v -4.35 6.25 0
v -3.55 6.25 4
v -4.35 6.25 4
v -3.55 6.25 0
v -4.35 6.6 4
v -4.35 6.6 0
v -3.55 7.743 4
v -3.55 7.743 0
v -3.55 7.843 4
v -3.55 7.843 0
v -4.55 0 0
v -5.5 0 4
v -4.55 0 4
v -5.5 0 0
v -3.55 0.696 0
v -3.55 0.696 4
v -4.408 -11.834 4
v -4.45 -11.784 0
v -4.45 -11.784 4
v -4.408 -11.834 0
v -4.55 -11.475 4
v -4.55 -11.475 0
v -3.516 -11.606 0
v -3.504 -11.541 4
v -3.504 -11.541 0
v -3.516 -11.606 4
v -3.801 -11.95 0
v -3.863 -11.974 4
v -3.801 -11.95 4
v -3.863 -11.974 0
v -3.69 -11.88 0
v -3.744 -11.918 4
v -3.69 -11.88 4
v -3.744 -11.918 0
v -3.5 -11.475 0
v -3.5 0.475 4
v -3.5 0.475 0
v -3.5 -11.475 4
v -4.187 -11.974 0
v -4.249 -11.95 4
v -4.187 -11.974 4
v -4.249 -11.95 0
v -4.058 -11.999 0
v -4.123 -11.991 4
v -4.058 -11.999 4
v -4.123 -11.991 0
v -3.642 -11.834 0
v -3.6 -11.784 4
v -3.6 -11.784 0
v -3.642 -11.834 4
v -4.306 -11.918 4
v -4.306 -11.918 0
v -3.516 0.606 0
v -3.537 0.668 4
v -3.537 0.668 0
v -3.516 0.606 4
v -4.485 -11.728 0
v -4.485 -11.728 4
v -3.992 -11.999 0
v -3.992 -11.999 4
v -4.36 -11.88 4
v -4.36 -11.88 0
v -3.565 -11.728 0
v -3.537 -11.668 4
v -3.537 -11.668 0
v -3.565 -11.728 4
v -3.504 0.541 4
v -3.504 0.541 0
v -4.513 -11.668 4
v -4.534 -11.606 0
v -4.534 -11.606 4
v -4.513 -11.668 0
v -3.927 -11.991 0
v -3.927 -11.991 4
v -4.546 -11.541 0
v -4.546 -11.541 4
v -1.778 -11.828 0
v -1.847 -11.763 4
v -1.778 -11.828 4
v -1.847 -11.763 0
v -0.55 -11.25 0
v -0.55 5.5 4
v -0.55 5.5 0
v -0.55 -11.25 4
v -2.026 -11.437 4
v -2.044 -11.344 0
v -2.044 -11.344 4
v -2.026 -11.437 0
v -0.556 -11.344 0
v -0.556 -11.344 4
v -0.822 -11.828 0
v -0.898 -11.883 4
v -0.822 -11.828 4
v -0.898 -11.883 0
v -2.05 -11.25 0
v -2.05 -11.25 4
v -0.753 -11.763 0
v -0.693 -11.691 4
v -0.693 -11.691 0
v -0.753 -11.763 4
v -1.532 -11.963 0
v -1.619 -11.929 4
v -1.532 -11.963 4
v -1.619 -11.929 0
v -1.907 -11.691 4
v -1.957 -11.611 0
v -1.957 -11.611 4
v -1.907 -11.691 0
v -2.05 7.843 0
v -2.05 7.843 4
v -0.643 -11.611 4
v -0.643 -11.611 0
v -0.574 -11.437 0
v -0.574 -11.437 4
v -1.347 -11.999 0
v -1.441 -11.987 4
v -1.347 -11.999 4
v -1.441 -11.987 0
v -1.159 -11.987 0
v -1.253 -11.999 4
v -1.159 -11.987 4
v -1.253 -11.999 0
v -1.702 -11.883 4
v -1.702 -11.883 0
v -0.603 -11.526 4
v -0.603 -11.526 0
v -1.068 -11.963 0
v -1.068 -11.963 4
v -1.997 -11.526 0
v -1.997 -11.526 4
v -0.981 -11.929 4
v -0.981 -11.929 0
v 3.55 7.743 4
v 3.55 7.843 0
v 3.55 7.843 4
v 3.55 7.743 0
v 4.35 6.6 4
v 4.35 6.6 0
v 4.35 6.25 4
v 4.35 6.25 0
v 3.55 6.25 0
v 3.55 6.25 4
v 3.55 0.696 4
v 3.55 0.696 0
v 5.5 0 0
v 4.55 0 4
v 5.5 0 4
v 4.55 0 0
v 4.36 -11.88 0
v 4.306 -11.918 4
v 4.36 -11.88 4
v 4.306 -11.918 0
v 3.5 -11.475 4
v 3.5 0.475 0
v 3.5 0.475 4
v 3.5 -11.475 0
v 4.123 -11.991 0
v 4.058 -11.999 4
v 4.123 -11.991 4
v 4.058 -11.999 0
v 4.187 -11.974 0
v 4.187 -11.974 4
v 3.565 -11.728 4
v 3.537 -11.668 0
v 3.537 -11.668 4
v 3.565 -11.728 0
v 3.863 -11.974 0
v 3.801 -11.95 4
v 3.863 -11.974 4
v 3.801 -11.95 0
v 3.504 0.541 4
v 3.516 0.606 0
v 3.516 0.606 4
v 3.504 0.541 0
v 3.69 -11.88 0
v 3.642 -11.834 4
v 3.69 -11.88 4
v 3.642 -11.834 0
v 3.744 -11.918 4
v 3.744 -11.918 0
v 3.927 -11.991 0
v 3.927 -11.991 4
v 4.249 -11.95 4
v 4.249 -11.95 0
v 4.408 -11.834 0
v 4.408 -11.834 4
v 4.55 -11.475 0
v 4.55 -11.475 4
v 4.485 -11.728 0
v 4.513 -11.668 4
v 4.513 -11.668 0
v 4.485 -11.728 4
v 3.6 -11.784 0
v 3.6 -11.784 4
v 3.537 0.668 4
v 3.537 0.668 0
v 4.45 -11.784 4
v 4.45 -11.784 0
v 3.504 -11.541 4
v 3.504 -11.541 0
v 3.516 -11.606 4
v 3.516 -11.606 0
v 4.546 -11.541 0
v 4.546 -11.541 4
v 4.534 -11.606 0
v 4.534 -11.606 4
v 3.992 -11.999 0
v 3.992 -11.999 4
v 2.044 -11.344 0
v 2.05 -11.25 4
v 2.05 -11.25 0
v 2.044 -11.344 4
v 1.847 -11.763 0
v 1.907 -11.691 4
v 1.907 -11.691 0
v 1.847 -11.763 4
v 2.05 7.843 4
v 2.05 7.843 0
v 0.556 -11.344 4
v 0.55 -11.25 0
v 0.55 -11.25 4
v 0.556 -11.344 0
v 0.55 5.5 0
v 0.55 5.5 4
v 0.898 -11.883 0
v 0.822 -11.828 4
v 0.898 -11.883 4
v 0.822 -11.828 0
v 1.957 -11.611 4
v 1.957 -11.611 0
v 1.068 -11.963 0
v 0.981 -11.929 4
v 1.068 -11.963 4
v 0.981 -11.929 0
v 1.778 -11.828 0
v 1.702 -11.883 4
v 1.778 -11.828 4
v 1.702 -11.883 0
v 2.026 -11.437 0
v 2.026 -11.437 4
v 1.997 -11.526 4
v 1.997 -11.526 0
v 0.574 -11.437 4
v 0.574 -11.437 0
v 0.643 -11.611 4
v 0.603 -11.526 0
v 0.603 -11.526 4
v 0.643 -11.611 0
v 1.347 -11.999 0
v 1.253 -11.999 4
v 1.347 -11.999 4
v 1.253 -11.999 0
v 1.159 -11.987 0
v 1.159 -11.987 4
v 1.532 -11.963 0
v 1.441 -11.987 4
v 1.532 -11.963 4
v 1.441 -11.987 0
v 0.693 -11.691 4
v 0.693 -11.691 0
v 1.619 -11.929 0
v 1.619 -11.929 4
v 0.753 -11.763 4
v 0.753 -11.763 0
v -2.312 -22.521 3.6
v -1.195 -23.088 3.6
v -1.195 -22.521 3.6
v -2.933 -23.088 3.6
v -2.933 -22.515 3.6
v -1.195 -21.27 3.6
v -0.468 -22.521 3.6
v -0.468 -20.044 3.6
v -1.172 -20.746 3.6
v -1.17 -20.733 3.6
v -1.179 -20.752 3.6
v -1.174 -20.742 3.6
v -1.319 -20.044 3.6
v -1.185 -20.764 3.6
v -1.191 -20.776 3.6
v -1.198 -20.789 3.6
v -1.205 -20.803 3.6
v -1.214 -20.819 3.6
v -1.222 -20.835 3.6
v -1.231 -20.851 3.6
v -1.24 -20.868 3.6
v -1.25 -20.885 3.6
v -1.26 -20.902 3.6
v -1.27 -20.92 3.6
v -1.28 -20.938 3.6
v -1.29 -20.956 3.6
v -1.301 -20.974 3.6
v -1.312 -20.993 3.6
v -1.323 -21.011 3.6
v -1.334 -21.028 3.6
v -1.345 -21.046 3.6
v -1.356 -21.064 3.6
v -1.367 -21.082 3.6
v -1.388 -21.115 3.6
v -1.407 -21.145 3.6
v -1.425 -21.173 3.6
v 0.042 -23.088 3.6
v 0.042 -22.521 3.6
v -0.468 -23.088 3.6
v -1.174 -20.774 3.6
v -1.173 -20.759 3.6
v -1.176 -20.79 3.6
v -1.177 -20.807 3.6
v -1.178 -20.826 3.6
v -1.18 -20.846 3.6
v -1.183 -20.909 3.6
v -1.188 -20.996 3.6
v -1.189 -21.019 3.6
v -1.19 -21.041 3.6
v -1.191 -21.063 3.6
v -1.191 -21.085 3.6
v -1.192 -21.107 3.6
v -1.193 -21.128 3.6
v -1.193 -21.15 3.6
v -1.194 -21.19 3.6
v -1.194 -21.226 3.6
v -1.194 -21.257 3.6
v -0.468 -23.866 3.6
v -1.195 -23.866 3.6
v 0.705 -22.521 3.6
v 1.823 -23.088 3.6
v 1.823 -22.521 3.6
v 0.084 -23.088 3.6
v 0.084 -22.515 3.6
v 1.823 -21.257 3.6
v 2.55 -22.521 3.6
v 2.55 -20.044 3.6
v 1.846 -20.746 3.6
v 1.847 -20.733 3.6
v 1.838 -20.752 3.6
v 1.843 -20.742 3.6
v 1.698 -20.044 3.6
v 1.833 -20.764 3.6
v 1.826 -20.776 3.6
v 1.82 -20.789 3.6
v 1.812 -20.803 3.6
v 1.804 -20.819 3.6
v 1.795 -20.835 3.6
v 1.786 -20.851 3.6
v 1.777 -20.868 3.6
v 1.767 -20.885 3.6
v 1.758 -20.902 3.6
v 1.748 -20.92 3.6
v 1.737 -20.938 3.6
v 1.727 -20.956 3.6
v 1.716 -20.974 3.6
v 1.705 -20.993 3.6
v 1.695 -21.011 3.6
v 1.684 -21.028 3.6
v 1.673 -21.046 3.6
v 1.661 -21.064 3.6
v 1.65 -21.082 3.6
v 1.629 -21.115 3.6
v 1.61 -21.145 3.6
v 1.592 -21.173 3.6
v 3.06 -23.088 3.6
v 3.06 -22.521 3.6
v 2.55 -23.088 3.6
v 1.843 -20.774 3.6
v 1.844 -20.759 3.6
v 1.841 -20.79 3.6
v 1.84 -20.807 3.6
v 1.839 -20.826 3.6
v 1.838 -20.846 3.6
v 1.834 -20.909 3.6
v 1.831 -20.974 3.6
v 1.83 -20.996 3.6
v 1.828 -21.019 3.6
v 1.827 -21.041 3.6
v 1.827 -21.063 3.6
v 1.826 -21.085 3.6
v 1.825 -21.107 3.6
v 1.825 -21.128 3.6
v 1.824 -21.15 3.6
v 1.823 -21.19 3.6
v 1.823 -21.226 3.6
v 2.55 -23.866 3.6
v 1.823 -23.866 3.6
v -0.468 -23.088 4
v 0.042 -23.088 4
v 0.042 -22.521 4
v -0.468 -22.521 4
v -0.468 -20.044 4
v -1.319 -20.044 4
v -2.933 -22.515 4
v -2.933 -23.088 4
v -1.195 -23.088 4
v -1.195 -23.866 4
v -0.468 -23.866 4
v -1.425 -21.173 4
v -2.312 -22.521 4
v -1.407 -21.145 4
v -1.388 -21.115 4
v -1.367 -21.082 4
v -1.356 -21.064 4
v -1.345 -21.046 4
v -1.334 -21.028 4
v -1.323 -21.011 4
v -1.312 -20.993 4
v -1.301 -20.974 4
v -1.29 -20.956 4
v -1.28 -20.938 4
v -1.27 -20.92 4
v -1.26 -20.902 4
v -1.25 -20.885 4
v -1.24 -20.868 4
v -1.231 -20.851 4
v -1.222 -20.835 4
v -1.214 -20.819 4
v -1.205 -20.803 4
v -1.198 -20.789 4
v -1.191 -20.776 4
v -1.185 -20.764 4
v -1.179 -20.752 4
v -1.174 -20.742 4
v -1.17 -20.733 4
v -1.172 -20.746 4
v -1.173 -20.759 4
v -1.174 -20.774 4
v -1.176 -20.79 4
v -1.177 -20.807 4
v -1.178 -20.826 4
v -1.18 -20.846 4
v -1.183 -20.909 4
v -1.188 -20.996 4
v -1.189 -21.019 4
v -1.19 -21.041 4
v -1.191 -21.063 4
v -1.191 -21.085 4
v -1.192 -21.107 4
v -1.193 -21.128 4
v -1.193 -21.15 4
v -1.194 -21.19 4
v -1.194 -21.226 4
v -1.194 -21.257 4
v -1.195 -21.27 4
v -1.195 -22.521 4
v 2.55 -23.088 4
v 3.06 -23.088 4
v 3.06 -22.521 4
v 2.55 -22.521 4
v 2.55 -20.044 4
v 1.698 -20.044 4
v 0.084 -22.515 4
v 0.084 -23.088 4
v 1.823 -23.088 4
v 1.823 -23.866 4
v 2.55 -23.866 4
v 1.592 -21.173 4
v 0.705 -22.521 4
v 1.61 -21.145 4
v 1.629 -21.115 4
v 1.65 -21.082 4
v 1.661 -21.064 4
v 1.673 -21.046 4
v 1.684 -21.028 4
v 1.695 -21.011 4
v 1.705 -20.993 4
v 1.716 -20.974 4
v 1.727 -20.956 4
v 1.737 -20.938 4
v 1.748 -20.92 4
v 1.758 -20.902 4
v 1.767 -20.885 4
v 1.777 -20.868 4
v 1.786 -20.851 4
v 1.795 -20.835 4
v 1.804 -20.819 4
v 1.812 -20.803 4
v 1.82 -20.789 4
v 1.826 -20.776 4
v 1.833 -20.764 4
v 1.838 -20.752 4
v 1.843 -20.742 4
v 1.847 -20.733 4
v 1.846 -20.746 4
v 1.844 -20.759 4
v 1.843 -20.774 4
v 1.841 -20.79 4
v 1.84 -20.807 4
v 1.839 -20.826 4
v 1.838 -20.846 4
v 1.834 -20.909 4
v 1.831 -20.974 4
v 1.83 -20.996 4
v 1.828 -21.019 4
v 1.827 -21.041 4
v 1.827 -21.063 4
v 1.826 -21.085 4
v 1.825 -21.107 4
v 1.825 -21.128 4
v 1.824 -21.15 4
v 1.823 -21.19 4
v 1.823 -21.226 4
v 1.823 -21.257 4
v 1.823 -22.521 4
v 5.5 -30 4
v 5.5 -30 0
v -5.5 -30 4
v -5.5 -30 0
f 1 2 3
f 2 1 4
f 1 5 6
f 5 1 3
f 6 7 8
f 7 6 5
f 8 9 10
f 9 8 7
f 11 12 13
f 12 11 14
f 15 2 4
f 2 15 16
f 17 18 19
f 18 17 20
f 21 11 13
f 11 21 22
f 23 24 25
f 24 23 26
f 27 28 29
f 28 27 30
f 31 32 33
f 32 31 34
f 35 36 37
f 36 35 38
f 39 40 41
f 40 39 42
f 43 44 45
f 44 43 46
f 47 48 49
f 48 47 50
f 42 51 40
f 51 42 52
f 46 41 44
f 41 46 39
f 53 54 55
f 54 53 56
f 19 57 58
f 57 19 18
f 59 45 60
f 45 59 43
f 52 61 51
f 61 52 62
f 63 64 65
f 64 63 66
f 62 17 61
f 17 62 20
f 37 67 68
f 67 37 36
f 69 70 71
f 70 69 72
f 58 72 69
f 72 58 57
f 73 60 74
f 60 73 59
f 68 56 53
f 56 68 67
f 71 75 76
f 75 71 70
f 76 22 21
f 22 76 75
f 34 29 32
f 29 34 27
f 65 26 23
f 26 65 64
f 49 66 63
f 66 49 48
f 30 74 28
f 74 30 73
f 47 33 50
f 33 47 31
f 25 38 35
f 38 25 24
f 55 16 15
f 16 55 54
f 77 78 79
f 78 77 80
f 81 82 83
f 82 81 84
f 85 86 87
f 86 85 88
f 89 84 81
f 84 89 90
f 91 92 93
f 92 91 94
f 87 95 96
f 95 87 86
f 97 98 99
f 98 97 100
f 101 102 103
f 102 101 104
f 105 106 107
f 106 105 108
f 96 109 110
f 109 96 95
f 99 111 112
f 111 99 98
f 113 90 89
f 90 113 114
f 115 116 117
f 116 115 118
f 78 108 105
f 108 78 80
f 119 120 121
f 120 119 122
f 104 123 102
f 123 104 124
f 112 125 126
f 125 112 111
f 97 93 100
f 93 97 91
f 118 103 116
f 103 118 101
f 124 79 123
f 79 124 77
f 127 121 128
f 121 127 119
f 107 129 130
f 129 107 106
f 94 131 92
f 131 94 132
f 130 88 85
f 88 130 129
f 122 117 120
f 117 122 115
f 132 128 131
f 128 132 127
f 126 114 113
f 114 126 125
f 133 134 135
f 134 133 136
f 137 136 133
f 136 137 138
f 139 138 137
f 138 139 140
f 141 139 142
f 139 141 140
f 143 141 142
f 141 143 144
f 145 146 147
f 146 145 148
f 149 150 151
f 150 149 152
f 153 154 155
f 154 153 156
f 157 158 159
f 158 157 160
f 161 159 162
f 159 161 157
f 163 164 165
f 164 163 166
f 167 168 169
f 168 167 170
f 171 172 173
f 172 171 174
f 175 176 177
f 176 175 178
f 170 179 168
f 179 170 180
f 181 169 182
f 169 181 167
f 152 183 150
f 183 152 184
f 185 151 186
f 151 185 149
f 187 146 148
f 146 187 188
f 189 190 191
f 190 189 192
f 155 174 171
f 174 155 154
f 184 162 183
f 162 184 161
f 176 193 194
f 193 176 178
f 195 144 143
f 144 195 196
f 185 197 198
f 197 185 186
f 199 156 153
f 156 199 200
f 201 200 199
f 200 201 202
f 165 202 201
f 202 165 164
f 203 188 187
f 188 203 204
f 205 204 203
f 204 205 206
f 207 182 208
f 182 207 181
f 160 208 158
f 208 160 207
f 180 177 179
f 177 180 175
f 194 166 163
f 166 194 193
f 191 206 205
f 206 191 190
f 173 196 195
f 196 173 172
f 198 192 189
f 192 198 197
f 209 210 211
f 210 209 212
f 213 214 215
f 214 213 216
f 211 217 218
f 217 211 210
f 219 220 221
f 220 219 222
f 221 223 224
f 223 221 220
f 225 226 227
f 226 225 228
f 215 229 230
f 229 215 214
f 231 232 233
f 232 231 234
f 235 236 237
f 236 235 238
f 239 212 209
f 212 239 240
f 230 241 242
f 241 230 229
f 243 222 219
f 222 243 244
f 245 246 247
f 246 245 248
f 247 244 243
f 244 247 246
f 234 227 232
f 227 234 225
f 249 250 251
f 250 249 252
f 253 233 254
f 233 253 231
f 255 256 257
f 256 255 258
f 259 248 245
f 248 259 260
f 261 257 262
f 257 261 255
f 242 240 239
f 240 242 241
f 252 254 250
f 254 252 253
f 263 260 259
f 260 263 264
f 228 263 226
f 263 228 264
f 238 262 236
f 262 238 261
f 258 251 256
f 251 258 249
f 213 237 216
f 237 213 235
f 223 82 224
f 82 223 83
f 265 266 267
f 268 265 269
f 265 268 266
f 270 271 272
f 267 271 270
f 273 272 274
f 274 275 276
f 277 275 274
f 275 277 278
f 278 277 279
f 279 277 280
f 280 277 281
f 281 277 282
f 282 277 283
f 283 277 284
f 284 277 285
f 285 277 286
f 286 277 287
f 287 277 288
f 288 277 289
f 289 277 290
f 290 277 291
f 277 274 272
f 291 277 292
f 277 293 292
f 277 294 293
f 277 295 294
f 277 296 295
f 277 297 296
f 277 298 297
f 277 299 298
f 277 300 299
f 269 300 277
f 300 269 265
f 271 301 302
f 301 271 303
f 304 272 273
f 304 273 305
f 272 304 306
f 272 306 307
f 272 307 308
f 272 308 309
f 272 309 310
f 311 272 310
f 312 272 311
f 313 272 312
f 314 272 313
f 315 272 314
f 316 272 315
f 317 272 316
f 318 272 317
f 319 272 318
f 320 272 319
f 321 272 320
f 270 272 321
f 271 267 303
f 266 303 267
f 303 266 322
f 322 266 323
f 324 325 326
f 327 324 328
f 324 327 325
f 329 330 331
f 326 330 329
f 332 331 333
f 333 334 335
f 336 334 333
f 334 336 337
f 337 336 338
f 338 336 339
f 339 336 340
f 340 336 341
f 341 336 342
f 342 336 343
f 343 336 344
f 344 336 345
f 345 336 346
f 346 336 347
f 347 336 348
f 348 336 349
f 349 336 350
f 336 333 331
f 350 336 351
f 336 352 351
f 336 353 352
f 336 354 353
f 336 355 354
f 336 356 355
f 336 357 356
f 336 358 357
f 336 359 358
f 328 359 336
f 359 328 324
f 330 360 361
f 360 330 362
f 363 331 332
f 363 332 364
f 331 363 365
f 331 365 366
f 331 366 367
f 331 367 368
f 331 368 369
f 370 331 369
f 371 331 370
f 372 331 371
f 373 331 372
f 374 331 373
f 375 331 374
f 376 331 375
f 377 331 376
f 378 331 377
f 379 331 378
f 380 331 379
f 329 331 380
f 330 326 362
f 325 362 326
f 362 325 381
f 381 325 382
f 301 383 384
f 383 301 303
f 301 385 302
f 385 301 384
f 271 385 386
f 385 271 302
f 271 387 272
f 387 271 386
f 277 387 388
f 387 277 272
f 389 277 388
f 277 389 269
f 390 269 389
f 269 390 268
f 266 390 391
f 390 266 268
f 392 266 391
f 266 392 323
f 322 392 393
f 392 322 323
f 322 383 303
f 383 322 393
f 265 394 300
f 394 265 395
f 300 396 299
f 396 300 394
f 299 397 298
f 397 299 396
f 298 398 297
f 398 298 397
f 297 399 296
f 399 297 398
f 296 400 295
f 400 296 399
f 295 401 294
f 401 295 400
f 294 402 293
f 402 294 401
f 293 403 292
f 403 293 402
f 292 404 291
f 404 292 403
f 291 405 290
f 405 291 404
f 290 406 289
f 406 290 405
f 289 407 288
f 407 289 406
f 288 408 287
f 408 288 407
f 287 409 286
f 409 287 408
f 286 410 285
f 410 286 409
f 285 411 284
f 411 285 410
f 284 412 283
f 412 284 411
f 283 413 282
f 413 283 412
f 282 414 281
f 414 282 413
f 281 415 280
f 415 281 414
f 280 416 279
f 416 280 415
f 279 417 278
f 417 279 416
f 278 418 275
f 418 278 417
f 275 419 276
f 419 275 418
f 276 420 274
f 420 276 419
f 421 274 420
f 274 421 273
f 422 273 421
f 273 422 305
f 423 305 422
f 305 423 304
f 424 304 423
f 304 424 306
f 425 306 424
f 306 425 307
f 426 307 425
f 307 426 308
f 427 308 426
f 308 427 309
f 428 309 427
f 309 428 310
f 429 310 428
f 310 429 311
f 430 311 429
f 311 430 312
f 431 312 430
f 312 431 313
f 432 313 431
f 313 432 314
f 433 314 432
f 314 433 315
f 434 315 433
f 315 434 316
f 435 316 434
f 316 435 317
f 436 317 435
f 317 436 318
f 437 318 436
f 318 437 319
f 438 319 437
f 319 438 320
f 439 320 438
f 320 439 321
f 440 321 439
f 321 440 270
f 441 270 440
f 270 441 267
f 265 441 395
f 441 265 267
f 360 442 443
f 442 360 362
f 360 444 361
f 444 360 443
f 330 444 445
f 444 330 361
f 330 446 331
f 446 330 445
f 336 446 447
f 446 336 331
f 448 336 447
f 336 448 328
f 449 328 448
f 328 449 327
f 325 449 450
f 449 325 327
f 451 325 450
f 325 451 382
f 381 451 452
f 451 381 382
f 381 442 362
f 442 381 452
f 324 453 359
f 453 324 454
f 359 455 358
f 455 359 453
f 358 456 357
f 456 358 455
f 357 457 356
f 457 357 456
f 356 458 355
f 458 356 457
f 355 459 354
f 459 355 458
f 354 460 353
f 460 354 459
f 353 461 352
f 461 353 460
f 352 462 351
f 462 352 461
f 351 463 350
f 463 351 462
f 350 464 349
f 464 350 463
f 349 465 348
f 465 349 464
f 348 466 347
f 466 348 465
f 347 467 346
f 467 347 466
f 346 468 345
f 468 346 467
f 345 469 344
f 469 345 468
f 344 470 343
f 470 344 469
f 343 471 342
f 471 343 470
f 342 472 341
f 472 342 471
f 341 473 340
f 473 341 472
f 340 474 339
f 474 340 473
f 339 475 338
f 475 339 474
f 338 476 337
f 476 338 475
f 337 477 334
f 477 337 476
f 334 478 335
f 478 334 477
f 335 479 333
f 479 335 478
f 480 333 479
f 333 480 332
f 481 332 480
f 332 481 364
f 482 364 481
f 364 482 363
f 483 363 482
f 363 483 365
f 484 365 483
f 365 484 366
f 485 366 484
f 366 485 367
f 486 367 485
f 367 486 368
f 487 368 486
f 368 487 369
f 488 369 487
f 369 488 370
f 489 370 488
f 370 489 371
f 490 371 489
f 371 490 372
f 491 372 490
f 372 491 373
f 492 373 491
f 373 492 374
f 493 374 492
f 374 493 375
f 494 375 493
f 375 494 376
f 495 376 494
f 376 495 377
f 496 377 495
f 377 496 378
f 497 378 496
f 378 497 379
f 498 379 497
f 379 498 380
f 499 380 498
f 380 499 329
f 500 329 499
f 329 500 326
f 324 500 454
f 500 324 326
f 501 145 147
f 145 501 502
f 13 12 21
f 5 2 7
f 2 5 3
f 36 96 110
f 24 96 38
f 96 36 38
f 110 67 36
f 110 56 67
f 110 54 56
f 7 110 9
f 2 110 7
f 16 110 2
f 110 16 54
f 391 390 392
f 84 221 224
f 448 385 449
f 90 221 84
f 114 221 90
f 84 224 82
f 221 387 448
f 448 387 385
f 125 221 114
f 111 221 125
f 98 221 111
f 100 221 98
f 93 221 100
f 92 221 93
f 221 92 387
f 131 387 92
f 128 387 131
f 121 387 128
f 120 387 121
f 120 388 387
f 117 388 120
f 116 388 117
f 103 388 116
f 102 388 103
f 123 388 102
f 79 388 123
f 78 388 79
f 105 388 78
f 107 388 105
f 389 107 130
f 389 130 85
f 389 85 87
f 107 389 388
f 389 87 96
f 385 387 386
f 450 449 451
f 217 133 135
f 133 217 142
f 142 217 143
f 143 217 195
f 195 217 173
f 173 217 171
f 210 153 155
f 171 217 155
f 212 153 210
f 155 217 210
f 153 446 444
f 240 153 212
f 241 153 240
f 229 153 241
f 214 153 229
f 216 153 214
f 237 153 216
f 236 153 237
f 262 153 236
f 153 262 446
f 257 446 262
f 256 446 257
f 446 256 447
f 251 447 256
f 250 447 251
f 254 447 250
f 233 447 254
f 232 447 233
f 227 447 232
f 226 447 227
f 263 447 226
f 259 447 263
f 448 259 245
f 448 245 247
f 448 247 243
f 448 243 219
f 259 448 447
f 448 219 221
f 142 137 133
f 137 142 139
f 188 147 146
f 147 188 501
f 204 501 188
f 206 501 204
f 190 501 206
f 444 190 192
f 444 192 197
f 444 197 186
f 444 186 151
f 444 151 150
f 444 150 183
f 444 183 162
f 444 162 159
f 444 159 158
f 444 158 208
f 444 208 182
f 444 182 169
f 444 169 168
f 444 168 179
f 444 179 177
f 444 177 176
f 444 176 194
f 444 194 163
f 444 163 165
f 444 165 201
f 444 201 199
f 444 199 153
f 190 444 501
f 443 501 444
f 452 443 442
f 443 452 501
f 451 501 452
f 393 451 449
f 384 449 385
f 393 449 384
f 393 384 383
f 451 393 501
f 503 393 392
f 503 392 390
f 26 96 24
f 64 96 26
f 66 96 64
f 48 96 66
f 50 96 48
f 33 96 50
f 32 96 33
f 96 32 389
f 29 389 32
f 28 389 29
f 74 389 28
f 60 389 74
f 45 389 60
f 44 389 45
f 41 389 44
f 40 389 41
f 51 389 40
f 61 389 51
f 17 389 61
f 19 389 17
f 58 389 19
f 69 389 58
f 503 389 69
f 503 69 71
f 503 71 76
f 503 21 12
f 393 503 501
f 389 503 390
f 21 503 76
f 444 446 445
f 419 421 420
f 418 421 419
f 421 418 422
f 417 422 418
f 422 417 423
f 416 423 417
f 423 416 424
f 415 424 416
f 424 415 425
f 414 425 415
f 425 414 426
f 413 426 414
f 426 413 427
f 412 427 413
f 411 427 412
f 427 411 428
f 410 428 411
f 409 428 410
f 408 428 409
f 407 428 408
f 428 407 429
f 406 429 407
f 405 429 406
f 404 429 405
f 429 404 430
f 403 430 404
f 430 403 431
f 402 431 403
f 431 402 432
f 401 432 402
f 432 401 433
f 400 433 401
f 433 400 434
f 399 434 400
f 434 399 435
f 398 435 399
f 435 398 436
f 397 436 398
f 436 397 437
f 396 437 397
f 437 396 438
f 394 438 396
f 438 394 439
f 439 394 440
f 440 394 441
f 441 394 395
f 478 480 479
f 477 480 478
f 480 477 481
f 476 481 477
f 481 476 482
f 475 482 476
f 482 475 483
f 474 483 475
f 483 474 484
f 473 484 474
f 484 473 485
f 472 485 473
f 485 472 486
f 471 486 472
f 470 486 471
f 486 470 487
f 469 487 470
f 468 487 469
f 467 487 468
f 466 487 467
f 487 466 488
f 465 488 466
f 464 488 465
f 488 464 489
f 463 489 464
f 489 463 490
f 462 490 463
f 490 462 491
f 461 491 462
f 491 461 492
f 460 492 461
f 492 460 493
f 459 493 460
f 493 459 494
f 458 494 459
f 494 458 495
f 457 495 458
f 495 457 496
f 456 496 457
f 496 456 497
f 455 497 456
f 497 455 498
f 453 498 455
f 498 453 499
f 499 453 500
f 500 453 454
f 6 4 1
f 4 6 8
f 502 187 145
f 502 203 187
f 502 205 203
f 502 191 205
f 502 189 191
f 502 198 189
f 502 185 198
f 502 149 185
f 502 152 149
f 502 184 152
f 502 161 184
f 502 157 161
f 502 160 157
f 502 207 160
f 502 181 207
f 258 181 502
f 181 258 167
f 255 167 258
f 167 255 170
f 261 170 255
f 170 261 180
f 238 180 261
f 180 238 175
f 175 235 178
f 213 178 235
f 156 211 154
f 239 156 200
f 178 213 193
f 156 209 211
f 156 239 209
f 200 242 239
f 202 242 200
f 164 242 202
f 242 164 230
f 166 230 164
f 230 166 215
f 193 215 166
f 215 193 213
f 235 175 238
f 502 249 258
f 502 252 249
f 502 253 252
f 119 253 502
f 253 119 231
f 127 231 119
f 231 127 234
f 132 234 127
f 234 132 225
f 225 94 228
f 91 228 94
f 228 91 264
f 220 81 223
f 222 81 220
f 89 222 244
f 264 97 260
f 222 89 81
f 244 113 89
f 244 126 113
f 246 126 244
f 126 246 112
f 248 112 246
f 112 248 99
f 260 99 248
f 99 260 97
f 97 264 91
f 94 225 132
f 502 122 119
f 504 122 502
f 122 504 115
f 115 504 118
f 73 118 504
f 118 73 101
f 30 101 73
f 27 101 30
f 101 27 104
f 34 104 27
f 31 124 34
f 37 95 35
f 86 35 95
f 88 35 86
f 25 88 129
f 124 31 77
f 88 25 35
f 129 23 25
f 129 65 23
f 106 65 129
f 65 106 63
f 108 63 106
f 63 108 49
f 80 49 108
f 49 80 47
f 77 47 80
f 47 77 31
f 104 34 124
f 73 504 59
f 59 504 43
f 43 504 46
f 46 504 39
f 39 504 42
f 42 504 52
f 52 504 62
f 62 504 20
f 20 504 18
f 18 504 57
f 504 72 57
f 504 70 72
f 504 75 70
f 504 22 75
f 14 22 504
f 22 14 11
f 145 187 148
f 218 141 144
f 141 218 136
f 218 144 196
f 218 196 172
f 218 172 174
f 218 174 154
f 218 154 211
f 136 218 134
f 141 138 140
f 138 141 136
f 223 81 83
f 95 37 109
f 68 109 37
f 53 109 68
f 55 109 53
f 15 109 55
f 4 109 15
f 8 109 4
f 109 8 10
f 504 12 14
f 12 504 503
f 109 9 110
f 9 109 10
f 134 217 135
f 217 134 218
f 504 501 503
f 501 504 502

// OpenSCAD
$fn = 50;

difference() {
	union() {
		translate(v = [0, 0, 0]) {
			rotate(a = [0, 0, 0]) {
				difference() {
					union() {
						translate(v = [-5.5, -30.0, 0]) {
							cube(size = [11.0, 37.84251840539369, 4.0]);
						}
					}
					union() {
						translate(v = [0, 0, -0.1]) {
							linear_extrude(height = 4.2) {
								polygon(points = [[-3.55, 0], [-3.55, 6.25], [-4.35, 6.25], [-4.35, 6.6], [-3.55, 7.7425184053936915], [-3.55, 8.84251840539369], [-5.7, 8.84251840539369], [-5.7, 0]]);
							}
						}
						translate(v = [-4.0249999999999995, -5.5, -0.1]) {
							hull() {
								translate(v = [-0.0, 5.975, 0]) {
									cylinder(h = 4.2, r = 0.525);
								}
								translate(v = [0.0, 5.975, 0]) {
									cylinder(h = 4.2, r = 0.525);
								}
								translate(v = [-0.0, -5.975, 0]) {
									cylinder(h = 4.2, r = 0.525);
								}
								translate(v = [0.0, -5.975, 0]) {
									cylinder(h = 4.2, r = 0.525);
								}
							}
						}
						translate(v = [-1.2999999999999998, -1.5787407973031549, -0.1]) {
							hull() {
								translate(v = [-0.0, 9.671259202696845, 0]) {
									cylinder(h = 4.2, r = 0.7499999999999999);
								}
								translate(v = [0.0, 9.671259202696845, 0]) {
									cylinder(h = 4.2, r = 0.7499999999999999);
								}
								translate(v = [-0.0, -9.671259202696845, 0]) {
									cylinder(h = 4.2, r = 0.7499999999999999);
								}
								translate(v = [0.0, -9.671259202696845, 0]) {
									cylinder(h = 4.2, r = 0.7499999999999999);
								}
							}
						}
						translate(v = [0, 0, -0.1]) {
							linear_extrude(height = 4.2) {
								polygon(points = [[3.55, 0], [3.55, 6.25], [4.35, 6.25], [4.35, 6.6], [3.55, 7.7425184053936915], [3.55, 8.84251840539369], [5.7, 8.84251840539369], [5.7, 0]]);
							}
						}
						translate(v = [4.0249999999999995, -5.5, -0.1]) {
							hull() {
								translate(v = [-0.0, 5.975, 0]) {
									cylinder(h = 4.2, r = 0.525);
								}
								translate(v = [0.0, 5.975, 0]) {
									cylinder(h = 4.2, r = 0.525);
								}
								translate(v = [-0.0, -5.975, 0]) {
									cylinder(h = 4.2, r = 0.525);
								}
								translate(v = [0.0, -5.975, 0]) {
									cylinder(h = 4.2, r = 0.525);
								}
							}
						}
						translate(v = [1.2999999999999998, -1.5787407973031549, -0.1]) {
							hull() {
								translate(v = [-0.0, 9.671259202696845, 0]) {
									cylinder(h = 4.2, r = 0.7499999999999999);
								}
								translate(v = [0.0, 9.671259202696845, 0]) {
									cylinder(h = 4.2, r = 0.7499999999999999);
								}
								translate(v = [-0.0, -9.671259202696845, 0]) {
									cylinder(h = 4.2, r = 0.7499999999999999);
								}
								translate(v = [0.0, -9.671259202696845, 0]) {
									cylinder(h = 4.2, r = 0.7499999999999999);
								}
							}
						}
						translate(v = [-0.6000000000000001, 5.5, -0.1]) {
							cube(size = [1.2000000000000002, 3.342518405393691, 4.2]);
						}
						translate(v = [0, -22, 3.6]) {
							linear_extrude(height = 0.5) {
								text(font = "Arial:style=Bold", halign = "center", size = 4.0, text = "44", valign = "center");
							}
						}
					}
				}
			}
		}
	}
	union();
}
